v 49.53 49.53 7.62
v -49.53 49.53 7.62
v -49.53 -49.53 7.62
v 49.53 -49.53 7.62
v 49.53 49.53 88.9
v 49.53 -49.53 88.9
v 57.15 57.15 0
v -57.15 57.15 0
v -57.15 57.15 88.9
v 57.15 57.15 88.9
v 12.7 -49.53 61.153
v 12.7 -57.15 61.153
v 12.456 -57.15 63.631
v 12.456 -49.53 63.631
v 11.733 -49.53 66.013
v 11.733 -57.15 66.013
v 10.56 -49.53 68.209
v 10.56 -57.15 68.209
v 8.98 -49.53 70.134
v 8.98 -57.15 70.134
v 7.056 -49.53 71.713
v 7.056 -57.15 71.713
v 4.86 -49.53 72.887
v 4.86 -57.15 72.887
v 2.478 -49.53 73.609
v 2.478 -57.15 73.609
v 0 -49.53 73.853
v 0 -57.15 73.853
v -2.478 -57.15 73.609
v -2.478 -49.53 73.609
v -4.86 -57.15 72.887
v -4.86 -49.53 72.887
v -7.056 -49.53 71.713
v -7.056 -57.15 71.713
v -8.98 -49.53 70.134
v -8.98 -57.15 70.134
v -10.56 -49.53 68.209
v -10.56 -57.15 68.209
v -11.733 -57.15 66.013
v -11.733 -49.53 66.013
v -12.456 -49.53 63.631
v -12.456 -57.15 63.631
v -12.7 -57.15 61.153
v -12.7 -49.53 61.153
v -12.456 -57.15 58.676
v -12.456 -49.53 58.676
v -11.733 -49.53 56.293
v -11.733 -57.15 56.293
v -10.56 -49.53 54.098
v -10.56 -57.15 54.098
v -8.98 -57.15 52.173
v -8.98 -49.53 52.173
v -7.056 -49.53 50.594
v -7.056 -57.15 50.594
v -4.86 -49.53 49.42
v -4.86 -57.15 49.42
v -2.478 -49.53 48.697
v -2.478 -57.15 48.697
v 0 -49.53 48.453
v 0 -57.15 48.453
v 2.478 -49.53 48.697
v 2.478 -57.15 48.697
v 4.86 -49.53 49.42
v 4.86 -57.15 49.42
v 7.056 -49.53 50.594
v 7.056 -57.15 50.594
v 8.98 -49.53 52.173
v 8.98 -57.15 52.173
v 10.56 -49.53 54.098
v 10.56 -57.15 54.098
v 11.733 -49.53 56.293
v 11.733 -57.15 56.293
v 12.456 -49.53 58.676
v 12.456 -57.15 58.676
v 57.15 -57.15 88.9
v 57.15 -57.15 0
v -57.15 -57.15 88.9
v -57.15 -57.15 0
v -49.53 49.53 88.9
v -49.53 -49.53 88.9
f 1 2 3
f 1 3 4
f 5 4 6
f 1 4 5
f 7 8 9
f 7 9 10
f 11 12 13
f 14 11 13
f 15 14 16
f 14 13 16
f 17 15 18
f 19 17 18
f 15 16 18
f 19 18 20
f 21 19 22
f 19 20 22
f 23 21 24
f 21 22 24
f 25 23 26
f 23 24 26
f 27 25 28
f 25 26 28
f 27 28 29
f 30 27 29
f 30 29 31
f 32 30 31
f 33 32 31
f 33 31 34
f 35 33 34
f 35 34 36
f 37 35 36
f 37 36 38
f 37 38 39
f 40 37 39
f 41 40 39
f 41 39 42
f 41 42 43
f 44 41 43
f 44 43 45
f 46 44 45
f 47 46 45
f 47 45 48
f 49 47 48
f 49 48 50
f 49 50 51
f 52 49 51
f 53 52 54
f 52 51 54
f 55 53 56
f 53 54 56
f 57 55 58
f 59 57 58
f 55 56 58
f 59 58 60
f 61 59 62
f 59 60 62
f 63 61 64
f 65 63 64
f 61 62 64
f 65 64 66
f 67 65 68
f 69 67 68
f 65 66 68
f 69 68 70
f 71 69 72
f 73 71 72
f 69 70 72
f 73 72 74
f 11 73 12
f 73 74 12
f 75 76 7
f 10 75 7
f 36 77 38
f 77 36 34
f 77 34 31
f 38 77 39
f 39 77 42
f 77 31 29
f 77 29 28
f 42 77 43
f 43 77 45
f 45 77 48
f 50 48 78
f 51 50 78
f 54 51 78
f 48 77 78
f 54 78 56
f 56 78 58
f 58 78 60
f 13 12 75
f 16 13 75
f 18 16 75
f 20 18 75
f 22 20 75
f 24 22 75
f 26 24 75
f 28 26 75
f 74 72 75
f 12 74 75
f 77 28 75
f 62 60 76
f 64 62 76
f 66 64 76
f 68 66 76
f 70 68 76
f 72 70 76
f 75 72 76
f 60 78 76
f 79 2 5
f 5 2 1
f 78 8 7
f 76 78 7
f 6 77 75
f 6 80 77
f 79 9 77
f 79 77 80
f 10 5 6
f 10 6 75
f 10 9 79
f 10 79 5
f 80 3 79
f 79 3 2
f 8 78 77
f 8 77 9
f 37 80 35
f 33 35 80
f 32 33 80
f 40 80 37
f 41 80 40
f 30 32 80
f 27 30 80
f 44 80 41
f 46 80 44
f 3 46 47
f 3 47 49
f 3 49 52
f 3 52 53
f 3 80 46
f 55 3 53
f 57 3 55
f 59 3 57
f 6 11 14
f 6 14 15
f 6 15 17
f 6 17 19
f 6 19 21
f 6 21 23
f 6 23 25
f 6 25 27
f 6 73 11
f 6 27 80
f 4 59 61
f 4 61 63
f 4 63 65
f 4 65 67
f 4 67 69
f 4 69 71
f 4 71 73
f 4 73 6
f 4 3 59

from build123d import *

# Parameters (mm, degrees)
F0_W     = 99.06
F0_H     = 99.06
F1_DEPTH = 7.62
F0_W_2   = 114.3
F0_H_2   = 114.3
F2_DEPTH = 88.9
F3_R     = 12.7
F4_DEPTH = 19.127706


with BuildPart() as f1:
    # F0 (on Top) → F1 (new body)
    with BuildSketch(Plane.XY):
        Rectangle(F0_W, F0_H)
    extrude(amount=F1_DEPTH)

    # F0 (on Top) → F2 (join)
    with BuildSketch(Plane.XY):
        Rectangle(F0_W_2, F0_H_2)
        Rectangle(F0_W, F0_H, mode=Mode.SUBTRACT)
    extrude(amount=F2_DEPTH)

    # F3 (on face) → F4 (cut)
    with BuildSketch(Plane.XZ.offset(57.15)):
        with Locations((0, 61.1534)):
            Circle(F3_R)
    extrude(amount=-F4_DEPTH, mode=Mode.SUBTRACT)


solid = f1.part
